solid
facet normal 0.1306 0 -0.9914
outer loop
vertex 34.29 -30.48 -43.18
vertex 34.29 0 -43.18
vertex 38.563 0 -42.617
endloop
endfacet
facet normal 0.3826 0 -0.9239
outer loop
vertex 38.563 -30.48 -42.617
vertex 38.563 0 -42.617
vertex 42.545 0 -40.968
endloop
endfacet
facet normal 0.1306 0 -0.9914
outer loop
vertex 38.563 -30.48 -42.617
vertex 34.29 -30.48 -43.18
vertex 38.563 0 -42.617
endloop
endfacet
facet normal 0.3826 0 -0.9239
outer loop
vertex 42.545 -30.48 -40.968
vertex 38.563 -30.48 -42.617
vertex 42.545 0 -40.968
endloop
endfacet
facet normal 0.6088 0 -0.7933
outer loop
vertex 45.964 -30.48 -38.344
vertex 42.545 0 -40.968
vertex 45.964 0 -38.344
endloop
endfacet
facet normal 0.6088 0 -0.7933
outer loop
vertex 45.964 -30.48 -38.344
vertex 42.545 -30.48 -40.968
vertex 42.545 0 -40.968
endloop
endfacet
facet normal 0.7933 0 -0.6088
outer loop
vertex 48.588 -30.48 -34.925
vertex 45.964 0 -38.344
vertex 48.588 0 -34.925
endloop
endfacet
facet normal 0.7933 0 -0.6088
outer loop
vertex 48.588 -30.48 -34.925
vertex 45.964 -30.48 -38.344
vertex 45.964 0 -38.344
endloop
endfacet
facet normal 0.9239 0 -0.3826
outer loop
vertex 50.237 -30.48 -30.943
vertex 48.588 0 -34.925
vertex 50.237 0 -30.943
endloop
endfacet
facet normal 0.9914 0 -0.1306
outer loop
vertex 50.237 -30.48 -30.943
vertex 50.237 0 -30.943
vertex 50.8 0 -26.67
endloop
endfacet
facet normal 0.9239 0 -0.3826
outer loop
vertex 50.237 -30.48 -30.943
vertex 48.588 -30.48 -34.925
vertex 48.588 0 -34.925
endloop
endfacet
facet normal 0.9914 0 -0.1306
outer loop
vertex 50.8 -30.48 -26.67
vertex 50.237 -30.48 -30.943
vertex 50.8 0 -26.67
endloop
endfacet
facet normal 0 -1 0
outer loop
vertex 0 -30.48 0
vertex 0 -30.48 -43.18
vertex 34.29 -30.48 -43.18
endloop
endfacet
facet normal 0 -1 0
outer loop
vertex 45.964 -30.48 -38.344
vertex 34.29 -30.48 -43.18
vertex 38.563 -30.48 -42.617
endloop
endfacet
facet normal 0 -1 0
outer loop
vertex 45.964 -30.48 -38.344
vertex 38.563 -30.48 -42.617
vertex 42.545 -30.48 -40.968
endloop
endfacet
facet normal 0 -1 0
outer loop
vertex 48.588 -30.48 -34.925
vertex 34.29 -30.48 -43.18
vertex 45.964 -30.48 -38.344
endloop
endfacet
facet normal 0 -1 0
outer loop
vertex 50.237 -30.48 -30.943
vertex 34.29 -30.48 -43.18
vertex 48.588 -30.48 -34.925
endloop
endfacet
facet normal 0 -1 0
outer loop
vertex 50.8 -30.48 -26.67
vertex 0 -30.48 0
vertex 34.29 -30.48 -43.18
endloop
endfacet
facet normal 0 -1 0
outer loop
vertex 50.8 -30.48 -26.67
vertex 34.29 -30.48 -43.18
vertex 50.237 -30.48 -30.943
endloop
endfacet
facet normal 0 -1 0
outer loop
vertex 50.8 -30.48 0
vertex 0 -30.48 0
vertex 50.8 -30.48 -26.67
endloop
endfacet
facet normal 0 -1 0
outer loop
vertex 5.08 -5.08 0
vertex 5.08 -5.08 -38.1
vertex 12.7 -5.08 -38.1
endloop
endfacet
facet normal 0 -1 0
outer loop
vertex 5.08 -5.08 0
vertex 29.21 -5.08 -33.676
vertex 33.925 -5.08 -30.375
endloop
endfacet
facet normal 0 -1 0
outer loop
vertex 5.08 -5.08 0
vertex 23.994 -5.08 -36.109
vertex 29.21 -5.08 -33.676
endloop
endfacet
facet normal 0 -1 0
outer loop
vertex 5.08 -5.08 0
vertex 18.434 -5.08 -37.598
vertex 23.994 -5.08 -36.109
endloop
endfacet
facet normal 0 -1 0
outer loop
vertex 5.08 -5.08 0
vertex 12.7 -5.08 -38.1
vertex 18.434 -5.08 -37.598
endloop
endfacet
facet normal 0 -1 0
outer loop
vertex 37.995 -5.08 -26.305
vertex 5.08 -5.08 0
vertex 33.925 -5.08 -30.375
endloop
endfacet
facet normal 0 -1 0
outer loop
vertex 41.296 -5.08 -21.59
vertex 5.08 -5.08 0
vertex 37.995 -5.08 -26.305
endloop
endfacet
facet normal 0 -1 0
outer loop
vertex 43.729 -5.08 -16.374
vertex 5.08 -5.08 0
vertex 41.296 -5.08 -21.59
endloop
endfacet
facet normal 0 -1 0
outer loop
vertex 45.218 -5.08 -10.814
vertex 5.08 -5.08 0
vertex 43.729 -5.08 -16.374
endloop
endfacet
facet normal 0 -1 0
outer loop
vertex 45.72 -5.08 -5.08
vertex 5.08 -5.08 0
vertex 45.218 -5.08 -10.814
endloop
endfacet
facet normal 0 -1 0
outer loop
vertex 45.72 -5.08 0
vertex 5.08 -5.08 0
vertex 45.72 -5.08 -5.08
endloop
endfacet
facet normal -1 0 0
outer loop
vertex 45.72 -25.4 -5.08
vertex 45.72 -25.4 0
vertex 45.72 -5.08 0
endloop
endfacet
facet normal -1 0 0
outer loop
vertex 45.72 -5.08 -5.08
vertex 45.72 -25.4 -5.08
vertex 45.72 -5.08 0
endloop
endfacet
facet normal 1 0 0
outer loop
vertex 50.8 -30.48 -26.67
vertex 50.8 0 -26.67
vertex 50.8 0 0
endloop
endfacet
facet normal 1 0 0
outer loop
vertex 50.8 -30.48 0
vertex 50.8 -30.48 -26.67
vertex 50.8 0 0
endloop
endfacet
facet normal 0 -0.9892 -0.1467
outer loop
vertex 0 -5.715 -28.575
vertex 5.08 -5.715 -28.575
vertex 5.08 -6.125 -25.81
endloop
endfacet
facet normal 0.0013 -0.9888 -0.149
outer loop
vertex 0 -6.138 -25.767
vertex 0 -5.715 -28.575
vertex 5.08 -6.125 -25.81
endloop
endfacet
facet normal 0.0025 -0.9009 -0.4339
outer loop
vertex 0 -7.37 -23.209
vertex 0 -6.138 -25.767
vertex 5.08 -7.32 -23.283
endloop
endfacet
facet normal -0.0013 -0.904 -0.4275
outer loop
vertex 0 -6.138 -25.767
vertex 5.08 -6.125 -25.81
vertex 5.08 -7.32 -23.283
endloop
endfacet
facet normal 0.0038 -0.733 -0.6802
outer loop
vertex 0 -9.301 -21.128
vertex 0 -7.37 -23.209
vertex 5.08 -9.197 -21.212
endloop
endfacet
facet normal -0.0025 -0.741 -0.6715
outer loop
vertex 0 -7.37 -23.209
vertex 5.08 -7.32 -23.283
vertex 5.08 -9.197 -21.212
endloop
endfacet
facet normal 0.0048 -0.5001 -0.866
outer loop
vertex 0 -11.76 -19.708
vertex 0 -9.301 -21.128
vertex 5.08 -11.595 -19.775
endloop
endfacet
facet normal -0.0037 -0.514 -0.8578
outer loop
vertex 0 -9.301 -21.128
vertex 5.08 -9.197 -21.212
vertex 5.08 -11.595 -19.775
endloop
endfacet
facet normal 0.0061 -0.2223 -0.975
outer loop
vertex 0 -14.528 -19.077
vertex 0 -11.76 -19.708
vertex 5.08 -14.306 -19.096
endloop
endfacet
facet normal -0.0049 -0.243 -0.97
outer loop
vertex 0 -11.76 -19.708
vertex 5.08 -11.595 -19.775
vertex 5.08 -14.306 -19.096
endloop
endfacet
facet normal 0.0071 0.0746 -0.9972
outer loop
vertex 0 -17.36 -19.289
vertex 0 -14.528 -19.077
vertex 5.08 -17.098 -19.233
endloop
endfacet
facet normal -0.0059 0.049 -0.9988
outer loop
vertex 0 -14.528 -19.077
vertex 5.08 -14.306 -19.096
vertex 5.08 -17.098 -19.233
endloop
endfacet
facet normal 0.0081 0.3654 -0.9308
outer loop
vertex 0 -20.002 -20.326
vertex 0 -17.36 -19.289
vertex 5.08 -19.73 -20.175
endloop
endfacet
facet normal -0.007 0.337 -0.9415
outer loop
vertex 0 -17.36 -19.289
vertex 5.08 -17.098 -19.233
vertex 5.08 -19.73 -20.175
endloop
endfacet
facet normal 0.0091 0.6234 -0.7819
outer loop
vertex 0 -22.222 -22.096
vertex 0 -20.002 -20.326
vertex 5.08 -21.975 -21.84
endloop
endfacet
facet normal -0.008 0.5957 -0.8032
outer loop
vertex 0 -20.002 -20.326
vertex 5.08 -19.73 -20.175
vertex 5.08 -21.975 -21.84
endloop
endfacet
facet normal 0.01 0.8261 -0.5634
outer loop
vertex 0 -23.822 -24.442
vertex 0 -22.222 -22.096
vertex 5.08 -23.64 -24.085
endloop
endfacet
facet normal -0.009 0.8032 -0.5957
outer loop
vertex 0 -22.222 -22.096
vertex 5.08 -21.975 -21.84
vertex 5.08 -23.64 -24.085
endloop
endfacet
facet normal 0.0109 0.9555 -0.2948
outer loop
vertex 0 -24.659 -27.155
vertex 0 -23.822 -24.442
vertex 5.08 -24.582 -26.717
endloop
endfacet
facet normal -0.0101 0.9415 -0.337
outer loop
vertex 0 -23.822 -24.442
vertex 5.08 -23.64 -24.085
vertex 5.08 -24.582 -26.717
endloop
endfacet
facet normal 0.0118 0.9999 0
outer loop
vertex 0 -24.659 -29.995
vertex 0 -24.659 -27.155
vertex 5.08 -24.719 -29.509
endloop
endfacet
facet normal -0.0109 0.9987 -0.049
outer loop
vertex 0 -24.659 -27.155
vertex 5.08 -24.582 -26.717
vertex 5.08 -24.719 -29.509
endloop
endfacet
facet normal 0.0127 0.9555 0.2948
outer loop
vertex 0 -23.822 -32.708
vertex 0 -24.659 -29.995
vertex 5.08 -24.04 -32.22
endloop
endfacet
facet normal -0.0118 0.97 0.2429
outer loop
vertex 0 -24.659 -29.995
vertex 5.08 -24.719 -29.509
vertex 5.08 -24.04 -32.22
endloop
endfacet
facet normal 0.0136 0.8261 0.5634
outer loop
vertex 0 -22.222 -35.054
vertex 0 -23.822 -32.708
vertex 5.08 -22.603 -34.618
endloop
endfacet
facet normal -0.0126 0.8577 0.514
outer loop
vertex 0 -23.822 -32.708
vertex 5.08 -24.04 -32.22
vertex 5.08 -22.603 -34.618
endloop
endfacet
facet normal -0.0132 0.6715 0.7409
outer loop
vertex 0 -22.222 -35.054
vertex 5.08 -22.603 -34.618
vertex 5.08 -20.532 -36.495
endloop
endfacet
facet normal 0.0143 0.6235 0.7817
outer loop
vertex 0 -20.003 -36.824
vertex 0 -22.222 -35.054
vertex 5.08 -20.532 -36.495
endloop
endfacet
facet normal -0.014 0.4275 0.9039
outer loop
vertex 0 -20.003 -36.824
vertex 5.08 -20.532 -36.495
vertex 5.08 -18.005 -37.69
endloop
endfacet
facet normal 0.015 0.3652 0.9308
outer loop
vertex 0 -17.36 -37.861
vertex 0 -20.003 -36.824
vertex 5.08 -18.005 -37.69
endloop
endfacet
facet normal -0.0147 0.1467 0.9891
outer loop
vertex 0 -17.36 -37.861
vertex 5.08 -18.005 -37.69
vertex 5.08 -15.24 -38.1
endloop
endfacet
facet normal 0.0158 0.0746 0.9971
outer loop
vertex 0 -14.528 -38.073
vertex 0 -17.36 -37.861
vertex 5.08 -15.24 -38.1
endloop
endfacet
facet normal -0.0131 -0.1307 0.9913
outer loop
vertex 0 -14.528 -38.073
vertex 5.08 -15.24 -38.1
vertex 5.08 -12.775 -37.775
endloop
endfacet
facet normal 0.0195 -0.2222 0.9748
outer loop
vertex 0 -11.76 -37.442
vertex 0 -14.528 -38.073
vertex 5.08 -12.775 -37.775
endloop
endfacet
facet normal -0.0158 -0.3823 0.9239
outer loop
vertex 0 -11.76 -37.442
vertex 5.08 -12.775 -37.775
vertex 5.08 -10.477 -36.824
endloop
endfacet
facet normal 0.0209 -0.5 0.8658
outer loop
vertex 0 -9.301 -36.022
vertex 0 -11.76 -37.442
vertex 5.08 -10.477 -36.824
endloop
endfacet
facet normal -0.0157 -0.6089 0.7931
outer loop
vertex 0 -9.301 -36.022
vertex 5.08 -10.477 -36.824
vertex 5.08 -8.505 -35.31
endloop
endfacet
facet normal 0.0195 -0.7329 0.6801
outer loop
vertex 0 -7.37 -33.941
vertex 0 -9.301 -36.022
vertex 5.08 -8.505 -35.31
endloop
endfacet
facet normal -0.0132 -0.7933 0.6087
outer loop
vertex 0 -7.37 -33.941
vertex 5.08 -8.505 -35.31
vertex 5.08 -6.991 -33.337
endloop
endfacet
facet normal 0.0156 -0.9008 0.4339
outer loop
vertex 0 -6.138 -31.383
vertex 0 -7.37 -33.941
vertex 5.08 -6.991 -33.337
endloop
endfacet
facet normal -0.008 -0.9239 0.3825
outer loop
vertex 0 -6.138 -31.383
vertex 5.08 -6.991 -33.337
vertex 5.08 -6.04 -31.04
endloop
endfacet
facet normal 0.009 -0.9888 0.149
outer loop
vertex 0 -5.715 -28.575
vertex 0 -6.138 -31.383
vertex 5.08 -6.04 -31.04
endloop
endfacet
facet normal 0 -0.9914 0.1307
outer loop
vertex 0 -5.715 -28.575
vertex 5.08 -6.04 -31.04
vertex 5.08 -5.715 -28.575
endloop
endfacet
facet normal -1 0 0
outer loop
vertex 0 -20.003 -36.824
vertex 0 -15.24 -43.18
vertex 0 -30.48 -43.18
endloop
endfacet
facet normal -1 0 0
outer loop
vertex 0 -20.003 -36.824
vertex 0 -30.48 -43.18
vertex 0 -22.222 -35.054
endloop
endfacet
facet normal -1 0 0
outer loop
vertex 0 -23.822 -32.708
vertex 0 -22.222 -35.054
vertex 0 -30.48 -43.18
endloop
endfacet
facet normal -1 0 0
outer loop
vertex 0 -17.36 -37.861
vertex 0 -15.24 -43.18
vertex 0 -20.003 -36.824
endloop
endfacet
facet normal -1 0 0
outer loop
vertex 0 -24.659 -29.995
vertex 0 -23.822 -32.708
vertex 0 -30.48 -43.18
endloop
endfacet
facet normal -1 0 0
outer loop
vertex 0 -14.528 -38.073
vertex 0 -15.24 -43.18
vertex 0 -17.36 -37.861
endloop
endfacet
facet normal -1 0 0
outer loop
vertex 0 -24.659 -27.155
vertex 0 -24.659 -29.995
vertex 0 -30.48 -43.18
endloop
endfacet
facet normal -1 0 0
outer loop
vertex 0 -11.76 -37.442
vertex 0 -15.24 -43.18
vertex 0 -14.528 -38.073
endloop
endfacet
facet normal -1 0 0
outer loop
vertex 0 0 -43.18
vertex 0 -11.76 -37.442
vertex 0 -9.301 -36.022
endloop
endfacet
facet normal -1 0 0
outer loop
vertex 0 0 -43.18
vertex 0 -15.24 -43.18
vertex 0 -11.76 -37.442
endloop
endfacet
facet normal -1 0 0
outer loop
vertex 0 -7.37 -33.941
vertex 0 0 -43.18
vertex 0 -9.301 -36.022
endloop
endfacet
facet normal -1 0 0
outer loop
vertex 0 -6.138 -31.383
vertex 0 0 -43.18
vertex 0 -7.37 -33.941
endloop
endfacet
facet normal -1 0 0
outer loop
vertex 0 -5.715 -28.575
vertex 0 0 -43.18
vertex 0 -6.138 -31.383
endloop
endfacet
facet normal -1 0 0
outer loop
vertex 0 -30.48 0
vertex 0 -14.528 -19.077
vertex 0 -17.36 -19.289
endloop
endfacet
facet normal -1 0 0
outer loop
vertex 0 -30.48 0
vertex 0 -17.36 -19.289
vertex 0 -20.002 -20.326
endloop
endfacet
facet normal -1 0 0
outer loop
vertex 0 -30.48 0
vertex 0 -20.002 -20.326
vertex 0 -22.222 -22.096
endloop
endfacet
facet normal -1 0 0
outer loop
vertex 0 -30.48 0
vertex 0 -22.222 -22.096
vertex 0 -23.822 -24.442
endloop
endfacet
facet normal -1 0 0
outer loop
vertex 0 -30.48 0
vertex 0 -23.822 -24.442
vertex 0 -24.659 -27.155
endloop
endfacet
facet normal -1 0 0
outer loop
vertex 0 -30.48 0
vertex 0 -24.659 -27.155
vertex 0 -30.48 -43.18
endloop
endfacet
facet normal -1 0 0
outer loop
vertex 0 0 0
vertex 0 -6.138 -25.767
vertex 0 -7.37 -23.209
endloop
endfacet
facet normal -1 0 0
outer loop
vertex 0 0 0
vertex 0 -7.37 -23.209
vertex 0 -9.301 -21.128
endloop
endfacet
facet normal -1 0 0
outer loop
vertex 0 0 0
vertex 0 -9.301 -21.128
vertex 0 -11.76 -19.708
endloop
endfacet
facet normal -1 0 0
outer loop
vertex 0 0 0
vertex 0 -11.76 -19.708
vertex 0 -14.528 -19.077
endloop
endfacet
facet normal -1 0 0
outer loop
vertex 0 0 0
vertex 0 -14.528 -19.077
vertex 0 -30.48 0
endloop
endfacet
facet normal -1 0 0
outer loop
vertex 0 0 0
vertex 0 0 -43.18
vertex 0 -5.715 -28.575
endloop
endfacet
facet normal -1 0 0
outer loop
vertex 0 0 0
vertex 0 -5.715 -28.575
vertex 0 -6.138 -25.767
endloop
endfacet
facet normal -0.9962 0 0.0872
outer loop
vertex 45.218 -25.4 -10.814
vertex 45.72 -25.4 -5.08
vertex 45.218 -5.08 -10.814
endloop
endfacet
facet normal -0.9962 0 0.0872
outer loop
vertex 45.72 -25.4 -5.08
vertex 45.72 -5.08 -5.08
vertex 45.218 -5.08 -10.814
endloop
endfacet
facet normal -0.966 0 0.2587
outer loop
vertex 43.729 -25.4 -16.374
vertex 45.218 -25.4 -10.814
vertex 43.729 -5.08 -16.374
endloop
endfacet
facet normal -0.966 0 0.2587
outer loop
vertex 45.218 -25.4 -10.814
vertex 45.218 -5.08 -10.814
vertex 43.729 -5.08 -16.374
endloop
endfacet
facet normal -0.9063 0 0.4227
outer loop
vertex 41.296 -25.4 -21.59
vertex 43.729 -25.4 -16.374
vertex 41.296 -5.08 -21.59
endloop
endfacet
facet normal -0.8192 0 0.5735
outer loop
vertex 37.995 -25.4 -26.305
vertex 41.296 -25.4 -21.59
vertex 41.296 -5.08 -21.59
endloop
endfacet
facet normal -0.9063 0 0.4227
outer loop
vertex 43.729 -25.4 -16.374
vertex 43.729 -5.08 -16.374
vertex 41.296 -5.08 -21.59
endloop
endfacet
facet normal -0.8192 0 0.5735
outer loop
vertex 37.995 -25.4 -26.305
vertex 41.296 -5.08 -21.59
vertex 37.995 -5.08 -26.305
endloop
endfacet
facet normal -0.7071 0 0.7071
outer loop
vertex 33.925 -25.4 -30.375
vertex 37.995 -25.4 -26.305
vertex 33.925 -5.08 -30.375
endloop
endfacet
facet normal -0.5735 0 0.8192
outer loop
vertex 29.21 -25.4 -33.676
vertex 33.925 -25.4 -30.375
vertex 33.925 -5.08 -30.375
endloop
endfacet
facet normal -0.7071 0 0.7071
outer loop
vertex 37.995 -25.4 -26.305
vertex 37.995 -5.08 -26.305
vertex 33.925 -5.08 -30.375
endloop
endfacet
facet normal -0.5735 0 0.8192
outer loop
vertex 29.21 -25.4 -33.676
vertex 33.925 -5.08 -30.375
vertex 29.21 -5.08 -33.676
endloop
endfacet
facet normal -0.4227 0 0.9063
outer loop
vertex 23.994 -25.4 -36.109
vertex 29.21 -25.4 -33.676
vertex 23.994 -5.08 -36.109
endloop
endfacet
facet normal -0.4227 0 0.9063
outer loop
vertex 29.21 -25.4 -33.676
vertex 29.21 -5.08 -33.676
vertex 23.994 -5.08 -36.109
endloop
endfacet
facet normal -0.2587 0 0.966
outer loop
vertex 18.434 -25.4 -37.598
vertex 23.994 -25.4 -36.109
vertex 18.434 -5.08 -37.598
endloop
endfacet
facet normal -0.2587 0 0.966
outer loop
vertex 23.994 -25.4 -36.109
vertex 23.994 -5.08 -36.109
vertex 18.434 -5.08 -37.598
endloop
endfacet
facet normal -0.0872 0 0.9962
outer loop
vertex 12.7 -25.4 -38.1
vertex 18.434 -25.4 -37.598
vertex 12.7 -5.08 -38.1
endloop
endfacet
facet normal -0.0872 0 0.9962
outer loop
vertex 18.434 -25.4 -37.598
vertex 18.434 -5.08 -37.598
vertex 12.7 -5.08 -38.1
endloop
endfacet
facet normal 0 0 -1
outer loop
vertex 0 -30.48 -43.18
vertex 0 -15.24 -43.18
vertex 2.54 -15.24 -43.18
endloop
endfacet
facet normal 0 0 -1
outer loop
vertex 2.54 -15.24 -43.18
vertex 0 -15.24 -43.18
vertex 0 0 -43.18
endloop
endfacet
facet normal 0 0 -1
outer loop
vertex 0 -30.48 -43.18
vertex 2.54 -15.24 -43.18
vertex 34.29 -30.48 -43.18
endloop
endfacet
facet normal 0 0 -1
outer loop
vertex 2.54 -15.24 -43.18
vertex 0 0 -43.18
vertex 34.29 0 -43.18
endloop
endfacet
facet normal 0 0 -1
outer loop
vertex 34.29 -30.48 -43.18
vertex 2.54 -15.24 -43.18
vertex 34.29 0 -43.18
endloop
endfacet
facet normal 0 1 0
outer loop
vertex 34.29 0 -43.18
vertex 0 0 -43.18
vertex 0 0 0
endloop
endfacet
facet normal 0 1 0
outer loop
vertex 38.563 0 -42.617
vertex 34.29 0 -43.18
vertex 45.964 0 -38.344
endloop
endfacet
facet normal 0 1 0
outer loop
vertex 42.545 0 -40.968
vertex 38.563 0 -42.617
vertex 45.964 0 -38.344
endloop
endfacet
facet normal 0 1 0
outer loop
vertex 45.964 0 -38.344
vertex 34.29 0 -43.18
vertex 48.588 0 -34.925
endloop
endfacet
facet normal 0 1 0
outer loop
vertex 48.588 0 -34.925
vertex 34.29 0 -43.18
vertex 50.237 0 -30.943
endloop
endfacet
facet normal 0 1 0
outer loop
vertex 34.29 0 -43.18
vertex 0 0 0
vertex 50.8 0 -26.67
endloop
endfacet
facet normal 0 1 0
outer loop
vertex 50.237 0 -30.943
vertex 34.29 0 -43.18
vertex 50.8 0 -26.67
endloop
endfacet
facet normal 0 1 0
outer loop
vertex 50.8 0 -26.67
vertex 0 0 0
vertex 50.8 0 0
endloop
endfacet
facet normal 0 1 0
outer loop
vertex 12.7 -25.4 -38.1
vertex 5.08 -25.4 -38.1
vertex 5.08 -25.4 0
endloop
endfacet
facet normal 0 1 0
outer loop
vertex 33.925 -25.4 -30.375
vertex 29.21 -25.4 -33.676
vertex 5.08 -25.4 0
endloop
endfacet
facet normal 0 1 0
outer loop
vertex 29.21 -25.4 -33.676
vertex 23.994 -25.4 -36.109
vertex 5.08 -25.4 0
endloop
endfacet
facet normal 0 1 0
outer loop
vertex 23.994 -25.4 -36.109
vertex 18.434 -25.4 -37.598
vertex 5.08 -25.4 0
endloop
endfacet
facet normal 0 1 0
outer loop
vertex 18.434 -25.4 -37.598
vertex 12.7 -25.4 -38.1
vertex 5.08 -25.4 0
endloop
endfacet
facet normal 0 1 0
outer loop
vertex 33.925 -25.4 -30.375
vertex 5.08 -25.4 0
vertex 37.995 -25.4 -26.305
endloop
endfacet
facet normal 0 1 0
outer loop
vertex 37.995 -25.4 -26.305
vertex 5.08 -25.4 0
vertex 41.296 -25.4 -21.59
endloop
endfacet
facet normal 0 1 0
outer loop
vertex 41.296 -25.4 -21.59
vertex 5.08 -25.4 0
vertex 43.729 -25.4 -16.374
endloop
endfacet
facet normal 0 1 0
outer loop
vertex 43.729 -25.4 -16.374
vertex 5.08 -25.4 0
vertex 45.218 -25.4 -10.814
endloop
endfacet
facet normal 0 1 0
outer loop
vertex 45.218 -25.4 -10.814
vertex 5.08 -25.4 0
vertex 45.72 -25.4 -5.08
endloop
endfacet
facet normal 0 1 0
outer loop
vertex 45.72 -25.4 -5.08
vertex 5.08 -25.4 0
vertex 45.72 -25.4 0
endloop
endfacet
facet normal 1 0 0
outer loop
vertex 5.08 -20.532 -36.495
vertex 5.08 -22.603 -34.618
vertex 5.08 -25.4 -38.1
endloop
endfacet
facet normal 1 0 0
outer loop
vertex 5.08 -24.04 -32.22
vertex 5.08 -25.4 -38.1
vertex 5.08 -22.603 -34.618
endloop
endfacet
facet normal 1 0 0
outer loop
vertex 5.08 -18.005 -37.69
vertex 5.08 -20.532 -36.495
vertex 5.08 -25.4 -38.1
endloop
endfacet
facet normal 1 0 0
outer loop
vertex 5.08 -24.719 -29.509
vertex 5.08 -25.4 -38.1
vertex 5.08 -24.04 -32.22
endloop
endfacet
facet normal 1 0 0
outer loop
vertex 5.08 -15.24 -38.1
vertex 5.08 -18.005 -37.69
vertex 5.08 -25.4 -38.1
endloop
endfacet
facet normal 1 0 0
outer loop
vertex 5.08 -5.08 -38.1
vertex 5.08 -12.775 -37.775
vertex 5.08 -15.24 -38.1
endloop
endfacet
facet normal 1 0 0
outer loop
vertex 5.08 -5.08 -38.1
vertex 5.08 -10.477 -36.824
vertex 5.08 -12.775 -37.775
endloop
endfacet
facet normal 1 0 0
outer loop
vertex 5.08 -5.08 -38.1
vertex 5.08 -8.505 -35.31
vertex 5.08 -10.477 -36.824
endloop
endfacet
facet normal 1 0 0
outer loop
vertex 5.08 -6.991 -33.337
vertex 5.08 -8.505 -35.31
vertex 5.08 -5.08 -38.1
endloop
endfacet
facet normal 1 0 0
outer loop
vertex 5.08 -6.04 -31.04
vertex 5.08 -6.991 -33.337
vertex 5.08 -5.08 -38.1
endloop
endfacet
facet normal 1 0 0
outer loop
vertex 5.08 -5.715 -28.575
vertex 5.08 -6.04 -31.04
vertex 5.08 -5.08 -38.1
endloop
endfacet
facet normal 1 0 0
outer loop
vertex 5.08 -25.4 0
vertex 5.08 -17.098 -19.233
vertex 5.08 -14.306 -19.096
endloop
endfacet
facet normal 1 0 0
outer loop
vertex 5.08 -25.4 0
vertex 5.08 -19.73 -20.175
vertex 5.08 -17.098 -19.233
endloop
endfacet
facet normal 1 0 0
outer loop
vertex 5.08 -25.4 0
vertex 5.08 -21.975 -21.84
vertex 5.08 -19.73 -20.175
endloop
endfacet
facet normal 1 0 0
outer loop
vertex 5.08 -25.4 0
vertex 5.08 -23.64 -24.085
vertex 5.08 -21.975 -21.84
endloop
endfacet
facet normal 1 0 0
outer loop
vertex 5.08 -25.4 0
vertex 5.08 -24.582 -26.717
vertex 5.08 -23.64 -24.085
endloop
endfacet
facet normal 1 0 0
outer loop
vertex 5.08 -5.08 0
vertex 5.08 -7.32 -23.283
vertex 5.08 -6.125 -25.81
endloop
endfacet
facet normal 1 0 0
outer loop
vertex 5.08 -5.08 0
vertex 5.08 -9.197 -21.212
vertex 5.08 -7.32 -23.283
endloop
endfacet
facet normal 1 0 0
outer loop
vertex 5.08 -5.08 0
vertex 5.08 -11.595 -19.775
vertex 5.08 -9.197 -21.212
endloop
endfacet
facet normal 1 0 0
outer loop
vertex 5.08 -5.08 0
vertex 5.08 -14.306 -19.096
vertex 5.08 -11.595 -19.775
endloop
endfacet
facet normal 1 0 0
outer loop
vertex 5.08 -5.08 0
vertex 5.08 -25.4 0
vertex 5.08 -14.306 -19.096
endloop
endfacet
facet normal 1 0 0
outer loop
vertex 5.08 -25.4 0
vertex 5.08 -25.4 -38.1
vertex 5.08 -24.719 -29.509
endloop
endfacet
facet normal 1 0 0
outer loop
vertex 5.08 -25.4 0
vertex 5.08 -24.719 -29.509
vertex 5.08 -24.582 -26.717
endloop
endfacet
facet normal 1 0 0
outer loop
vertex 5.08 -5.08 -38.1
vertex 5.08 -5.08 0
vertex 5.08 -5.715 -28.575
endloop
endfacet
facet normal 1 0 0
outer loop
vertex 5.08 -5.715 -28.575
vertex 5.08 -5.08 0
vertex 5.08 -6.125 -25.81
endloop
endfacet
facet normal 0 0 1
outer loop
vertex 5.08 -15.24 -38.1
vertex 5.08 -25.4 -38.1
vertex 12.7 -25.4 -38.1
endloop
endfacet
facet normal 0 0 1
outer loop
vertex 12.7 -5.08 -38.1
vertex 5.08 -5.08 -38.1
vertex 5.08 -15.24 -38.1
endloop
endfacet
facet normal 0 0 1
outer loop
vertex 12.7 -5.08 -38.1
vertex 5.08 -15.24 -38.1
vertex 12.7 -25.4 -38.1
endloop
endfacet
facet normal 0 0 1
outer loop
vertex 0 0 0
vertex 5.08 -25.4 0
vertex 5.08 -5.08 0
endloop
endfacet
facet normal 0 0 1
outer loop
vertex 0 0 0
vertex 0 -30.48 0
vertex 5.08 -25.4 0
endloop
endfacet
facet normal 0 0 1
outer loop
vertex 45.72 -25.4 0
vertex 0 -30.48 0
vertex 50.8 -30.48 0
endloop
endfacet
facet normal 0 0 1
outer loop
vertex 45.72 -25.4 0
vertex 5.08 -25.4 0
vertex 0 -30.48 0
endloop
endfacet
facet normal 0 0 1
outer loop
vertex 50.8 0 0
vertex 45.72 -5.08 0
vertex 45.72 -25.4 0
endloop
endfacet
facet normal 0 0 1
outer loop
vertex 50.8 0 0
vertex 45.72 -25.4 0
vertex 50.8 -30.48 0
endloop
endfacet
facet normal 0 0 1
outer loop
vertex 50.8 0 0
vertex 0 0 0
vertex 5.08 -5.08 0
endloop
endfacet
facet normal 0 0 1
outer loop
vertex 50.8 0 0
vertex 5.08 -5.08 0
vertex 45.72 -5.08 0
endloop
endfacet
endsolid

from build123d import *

# Parameters (mm, degrees)
F0_W     = 50.8
F0_H     = 43.18
F1_DEPTH = 30.48
F2_R     = 16.51
F3_W     = 40.64
F3_H     = 20.32
F4_DEPTH = 38.1
F6_DEPTH = 2.54
F7_R     = 33.02
F8_R     = 9.525
F9_DEPTH = 25.4


with BuildPart() as f1:
    # F0 (on Front) → F1 (new body)
    with BuildSketch(Plane.XZ):
        with Locations((25.4, -21.59)):
            Rectangle(F0_W, F0_H)
    extrude(amount=F1_DEPTH)

    # F2
    f2_edges = [f1.edges().sort_by_distance(p)[0] for p in [
        (50.8, -15.24, -43.18),
    ]]
    fillet(f2_edges, radius=F2_R)

    # F3 (on face) → F4 (cut)
    with BuildSketch(Plane.XY):
        with Locations((25.4, -15.24)):
            Rectangle(F3_W, F3_H)
    extrude(amount=-F4_DEPTH, mode=Mode.SUBTRACT)

    # F5 (on face) → F6 (join)
    with BuildSketch(Plane(origin=(0, 0, 0), x_dir=(0, -1, 0), z_dir=(-1, 0, 0))):
        with BuildLine():
            ThreePointArc((15.24, -43.18), (21.975192, -40.390192), (24.765, -33.655))
            ThreePointArc((24.765, -33.655), (8.504808, -26.919808), (15.24, -43.18))
        make_face()
    extrude(amount=-F6_DEPTH)

    # F7
    f7_edges = [f1.edges().sort_by_distance(p)[0] for p in [
        (45.72, -15.24, -38.1),
    ]]
    fillet(f7_edges, radius=F7_R)

    # F8 (on face) → F9 (cut)
    with BuildSketch(Plane.YZ.offset(5.08)):
        with Locations((-15.24, -28.575)):
            Circle(F8_R)
    extrude(amount=-F9_DEPTH, mode=Mode.SUBTRACT)


solid = f1.part
